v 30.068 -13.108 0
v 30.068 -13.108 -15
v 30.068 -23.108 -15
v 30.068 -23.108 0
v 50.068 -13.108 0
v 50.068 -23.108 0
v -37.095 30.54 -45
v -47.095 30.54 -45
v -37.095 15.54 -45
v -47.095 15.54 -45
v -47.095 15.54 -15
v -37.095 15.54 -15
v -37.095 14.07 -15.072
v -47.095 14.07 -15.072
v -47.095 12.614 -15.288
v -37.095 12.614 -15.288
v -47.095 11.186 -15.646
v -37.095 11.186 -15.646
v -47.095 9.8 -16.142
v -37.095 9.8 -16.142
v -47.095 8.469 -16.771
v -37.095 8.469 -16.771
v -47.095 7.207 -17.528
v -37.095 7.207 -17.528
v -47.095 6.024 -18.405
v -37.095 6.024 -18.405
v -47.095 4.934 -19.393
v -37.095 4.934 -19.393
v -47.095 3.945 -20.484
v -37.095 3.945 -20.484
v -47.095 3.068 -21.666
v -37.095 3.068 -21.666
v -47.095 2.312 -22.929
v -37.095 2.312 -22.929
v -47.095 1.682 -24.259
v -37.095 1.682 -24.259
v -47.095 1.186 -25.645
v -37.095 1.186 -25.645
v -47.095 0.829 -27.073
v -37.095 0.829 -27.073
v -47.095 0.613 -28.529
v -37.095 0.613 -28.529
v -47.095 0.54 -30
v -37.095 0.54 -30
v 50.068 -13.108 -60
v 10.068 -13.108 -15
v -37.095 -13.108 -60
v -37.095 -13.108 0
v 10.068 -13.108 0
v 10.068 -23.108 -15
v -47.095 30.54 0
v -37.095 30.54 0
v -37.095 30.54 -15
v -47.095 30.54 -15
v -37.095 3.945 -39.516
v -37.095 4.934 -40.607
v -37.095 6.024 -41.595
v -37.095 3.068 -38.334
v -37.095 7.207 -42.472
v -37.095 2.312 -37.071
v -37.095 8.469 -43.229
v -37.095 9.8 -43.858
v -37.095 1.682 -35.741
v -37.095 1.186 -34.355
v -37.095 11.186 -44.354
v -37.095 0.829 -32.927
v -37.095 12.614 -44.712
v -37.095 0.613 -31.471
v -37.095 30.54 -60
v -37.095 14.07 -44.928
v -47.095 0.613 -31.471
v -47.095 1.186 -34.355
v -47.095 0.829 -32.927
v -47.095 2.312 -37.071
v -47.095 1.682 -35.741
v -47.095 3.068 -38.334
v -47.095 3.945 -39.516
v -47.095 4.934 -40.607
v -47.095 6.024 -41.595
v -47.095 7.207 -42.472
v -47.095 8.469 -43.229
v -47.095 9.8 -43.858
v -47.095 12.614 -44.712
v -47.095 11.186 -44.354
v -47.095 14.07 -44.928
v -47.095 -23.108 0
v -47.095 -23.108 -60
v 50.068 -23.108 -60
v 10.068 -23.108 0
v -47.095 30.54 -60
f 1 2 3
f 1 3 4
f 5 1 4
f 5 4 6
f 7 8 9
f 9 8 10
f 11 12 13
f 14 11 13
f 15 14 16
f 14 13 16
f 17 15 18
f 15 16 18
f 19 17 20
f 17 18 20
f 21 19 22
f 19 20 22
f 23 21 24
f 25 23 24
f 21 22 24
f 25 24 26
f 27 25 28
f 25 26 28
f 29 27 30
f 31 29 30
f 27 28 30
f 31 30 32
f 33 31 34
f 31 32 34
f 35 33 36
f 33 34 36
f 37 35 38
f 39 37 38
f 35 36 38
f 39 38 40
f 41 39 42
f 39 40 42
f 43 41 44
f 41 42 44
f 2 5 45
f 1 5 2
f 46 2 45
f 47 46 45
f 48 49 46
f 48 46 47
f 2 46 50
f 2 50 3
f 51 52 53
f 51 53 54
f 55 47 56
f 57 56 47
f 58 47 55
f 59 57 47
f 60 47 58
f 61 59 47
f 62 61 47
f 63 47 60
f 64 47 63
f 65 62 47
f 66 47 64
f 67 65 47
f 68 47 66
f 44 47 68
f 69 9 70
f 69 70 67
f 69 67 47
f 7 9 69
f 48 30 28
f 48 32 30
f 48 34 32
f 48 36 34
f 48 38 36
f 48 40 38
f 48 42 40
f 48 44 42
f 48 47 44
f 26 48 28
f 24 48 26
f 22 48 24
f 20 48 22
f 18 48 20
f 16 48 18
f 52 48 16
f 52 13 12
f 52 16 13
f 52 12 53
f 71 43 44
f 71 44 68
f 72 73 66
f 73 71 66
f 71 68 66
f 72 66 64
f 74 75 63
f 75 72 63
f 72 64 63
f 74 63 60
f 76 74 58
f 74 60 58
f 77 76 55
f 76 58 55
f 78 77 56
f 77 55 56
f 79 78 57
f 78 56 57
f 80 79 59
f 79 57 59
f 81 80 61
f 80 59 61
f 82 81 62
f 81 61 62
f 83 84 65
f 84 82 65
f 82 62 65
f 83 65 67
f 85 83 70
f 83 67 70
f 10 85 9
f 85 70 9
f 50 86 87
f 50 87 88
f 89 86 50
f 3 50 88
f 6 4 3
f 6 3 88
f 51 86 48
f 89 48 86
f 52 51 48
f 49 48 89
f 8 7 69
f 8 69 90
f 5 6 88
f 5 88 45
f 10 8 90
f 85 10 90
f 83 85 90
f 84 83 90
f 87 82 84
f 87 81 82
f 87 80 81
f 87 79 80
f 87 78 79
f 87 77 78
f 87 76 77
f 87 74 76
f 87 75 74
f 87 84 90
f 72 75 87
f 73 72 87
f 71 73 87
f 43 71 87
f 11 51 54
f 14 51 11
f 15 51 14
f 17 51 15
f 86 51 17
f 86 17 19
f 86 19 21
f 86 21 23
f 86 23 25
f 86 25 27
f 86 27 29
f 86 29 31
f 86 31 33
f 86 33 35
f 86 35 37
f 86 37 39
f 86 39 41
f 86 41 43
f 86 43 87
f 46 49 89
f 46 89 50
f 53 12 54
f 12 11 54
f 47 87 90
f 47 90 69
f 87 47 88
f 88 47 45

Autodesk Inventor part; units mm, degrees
ref_plane "YZ Plane" through (0, 0, 0) normal (1, 0, 0) x (0, 1, 0)
ref_plane "XZ Plane" through (0, 0, 0) normal (0, 1, 0) x (-1, 0, 0)
ref_plane "XY Plane" through (0, 0, 0) normal (0, 0, 1) x (1, 0, 0)
sketch "Sketch1" plane through (0, 0, 0) normal (0, 0, 1) x (1, 0, 0)
  line L0 (-47.0946, 30.5405) -> (-47.0946, -23.1081)
  line L1 (-47.0946, -23.1081) -> (50.0676, -23.1081)
  line L2 (50.0676, -23.1081) -> (50.0676, -13.1081)
  line L3 (50.0676, -13.1081) -> (-37.0946, -13.1081)
  line L4 (-37.0946, -13.1081) -> (-37.0946, 30.5405)
  line L5 (-37.0946, 30.5405) -> (-47.0946, 30.5405)
  point P0 (0, 0)
  dimension "d0" = 10
  dimension "d1" = 10
extrude "Extrusion1" add sketch "Sketch1" against normal blind 60
sketch "Sketch2" plane through (-47.0946, -23.1081, 0) normal (-1, 0, 0) x (0, 0, 1)
  line L0 (-60, 0) -> (-60, 53.6486) projected
  line L1 (0, 53.6486) -> (-60, 53.6486) projected
  line L2 (-45, 53.6486) -> (-45, 23.6486)
  line L3 (-45, 23.6486) -> (-15, 23.6486)
  line L4 (-15, 23.6486) -> (-15, 53.6486)
  point P0 (0, 23.1081)
  dimension "d4" = 15
  dimension "d5" = 15
  dimension "d6" = 30
  dimension "d7" = 30
extrude "Extrusion2" cut sketch "Sketch2" against normal blind 40
fillet "Fillet1" radius 15 2 edges at (-42.0946, 0.5405, -45) (-42.0946, 0.5405, -15)
sketch "Sketch3" plane through (-37.0946, -13.1081, 0) normal (0, 1, 0) x (1, 0, 0)
  line L0 (-10, 0) -> (87.1622, 0) projected
  line L1 (47.1622, 0) -> (47.1622, 15)
  line L2 (47.1622, 15) -> (67.1622, 15)
  line L3 (67.1622, 15) -> (67.1622, 0)
  point P0 (37.0946, 0)
  dimension "d11" = 20
  dimension "d12" = 20
  dimension "d13" = 15
extrude "Extrusion3" cut sketch "Sketch3" against normal through all
